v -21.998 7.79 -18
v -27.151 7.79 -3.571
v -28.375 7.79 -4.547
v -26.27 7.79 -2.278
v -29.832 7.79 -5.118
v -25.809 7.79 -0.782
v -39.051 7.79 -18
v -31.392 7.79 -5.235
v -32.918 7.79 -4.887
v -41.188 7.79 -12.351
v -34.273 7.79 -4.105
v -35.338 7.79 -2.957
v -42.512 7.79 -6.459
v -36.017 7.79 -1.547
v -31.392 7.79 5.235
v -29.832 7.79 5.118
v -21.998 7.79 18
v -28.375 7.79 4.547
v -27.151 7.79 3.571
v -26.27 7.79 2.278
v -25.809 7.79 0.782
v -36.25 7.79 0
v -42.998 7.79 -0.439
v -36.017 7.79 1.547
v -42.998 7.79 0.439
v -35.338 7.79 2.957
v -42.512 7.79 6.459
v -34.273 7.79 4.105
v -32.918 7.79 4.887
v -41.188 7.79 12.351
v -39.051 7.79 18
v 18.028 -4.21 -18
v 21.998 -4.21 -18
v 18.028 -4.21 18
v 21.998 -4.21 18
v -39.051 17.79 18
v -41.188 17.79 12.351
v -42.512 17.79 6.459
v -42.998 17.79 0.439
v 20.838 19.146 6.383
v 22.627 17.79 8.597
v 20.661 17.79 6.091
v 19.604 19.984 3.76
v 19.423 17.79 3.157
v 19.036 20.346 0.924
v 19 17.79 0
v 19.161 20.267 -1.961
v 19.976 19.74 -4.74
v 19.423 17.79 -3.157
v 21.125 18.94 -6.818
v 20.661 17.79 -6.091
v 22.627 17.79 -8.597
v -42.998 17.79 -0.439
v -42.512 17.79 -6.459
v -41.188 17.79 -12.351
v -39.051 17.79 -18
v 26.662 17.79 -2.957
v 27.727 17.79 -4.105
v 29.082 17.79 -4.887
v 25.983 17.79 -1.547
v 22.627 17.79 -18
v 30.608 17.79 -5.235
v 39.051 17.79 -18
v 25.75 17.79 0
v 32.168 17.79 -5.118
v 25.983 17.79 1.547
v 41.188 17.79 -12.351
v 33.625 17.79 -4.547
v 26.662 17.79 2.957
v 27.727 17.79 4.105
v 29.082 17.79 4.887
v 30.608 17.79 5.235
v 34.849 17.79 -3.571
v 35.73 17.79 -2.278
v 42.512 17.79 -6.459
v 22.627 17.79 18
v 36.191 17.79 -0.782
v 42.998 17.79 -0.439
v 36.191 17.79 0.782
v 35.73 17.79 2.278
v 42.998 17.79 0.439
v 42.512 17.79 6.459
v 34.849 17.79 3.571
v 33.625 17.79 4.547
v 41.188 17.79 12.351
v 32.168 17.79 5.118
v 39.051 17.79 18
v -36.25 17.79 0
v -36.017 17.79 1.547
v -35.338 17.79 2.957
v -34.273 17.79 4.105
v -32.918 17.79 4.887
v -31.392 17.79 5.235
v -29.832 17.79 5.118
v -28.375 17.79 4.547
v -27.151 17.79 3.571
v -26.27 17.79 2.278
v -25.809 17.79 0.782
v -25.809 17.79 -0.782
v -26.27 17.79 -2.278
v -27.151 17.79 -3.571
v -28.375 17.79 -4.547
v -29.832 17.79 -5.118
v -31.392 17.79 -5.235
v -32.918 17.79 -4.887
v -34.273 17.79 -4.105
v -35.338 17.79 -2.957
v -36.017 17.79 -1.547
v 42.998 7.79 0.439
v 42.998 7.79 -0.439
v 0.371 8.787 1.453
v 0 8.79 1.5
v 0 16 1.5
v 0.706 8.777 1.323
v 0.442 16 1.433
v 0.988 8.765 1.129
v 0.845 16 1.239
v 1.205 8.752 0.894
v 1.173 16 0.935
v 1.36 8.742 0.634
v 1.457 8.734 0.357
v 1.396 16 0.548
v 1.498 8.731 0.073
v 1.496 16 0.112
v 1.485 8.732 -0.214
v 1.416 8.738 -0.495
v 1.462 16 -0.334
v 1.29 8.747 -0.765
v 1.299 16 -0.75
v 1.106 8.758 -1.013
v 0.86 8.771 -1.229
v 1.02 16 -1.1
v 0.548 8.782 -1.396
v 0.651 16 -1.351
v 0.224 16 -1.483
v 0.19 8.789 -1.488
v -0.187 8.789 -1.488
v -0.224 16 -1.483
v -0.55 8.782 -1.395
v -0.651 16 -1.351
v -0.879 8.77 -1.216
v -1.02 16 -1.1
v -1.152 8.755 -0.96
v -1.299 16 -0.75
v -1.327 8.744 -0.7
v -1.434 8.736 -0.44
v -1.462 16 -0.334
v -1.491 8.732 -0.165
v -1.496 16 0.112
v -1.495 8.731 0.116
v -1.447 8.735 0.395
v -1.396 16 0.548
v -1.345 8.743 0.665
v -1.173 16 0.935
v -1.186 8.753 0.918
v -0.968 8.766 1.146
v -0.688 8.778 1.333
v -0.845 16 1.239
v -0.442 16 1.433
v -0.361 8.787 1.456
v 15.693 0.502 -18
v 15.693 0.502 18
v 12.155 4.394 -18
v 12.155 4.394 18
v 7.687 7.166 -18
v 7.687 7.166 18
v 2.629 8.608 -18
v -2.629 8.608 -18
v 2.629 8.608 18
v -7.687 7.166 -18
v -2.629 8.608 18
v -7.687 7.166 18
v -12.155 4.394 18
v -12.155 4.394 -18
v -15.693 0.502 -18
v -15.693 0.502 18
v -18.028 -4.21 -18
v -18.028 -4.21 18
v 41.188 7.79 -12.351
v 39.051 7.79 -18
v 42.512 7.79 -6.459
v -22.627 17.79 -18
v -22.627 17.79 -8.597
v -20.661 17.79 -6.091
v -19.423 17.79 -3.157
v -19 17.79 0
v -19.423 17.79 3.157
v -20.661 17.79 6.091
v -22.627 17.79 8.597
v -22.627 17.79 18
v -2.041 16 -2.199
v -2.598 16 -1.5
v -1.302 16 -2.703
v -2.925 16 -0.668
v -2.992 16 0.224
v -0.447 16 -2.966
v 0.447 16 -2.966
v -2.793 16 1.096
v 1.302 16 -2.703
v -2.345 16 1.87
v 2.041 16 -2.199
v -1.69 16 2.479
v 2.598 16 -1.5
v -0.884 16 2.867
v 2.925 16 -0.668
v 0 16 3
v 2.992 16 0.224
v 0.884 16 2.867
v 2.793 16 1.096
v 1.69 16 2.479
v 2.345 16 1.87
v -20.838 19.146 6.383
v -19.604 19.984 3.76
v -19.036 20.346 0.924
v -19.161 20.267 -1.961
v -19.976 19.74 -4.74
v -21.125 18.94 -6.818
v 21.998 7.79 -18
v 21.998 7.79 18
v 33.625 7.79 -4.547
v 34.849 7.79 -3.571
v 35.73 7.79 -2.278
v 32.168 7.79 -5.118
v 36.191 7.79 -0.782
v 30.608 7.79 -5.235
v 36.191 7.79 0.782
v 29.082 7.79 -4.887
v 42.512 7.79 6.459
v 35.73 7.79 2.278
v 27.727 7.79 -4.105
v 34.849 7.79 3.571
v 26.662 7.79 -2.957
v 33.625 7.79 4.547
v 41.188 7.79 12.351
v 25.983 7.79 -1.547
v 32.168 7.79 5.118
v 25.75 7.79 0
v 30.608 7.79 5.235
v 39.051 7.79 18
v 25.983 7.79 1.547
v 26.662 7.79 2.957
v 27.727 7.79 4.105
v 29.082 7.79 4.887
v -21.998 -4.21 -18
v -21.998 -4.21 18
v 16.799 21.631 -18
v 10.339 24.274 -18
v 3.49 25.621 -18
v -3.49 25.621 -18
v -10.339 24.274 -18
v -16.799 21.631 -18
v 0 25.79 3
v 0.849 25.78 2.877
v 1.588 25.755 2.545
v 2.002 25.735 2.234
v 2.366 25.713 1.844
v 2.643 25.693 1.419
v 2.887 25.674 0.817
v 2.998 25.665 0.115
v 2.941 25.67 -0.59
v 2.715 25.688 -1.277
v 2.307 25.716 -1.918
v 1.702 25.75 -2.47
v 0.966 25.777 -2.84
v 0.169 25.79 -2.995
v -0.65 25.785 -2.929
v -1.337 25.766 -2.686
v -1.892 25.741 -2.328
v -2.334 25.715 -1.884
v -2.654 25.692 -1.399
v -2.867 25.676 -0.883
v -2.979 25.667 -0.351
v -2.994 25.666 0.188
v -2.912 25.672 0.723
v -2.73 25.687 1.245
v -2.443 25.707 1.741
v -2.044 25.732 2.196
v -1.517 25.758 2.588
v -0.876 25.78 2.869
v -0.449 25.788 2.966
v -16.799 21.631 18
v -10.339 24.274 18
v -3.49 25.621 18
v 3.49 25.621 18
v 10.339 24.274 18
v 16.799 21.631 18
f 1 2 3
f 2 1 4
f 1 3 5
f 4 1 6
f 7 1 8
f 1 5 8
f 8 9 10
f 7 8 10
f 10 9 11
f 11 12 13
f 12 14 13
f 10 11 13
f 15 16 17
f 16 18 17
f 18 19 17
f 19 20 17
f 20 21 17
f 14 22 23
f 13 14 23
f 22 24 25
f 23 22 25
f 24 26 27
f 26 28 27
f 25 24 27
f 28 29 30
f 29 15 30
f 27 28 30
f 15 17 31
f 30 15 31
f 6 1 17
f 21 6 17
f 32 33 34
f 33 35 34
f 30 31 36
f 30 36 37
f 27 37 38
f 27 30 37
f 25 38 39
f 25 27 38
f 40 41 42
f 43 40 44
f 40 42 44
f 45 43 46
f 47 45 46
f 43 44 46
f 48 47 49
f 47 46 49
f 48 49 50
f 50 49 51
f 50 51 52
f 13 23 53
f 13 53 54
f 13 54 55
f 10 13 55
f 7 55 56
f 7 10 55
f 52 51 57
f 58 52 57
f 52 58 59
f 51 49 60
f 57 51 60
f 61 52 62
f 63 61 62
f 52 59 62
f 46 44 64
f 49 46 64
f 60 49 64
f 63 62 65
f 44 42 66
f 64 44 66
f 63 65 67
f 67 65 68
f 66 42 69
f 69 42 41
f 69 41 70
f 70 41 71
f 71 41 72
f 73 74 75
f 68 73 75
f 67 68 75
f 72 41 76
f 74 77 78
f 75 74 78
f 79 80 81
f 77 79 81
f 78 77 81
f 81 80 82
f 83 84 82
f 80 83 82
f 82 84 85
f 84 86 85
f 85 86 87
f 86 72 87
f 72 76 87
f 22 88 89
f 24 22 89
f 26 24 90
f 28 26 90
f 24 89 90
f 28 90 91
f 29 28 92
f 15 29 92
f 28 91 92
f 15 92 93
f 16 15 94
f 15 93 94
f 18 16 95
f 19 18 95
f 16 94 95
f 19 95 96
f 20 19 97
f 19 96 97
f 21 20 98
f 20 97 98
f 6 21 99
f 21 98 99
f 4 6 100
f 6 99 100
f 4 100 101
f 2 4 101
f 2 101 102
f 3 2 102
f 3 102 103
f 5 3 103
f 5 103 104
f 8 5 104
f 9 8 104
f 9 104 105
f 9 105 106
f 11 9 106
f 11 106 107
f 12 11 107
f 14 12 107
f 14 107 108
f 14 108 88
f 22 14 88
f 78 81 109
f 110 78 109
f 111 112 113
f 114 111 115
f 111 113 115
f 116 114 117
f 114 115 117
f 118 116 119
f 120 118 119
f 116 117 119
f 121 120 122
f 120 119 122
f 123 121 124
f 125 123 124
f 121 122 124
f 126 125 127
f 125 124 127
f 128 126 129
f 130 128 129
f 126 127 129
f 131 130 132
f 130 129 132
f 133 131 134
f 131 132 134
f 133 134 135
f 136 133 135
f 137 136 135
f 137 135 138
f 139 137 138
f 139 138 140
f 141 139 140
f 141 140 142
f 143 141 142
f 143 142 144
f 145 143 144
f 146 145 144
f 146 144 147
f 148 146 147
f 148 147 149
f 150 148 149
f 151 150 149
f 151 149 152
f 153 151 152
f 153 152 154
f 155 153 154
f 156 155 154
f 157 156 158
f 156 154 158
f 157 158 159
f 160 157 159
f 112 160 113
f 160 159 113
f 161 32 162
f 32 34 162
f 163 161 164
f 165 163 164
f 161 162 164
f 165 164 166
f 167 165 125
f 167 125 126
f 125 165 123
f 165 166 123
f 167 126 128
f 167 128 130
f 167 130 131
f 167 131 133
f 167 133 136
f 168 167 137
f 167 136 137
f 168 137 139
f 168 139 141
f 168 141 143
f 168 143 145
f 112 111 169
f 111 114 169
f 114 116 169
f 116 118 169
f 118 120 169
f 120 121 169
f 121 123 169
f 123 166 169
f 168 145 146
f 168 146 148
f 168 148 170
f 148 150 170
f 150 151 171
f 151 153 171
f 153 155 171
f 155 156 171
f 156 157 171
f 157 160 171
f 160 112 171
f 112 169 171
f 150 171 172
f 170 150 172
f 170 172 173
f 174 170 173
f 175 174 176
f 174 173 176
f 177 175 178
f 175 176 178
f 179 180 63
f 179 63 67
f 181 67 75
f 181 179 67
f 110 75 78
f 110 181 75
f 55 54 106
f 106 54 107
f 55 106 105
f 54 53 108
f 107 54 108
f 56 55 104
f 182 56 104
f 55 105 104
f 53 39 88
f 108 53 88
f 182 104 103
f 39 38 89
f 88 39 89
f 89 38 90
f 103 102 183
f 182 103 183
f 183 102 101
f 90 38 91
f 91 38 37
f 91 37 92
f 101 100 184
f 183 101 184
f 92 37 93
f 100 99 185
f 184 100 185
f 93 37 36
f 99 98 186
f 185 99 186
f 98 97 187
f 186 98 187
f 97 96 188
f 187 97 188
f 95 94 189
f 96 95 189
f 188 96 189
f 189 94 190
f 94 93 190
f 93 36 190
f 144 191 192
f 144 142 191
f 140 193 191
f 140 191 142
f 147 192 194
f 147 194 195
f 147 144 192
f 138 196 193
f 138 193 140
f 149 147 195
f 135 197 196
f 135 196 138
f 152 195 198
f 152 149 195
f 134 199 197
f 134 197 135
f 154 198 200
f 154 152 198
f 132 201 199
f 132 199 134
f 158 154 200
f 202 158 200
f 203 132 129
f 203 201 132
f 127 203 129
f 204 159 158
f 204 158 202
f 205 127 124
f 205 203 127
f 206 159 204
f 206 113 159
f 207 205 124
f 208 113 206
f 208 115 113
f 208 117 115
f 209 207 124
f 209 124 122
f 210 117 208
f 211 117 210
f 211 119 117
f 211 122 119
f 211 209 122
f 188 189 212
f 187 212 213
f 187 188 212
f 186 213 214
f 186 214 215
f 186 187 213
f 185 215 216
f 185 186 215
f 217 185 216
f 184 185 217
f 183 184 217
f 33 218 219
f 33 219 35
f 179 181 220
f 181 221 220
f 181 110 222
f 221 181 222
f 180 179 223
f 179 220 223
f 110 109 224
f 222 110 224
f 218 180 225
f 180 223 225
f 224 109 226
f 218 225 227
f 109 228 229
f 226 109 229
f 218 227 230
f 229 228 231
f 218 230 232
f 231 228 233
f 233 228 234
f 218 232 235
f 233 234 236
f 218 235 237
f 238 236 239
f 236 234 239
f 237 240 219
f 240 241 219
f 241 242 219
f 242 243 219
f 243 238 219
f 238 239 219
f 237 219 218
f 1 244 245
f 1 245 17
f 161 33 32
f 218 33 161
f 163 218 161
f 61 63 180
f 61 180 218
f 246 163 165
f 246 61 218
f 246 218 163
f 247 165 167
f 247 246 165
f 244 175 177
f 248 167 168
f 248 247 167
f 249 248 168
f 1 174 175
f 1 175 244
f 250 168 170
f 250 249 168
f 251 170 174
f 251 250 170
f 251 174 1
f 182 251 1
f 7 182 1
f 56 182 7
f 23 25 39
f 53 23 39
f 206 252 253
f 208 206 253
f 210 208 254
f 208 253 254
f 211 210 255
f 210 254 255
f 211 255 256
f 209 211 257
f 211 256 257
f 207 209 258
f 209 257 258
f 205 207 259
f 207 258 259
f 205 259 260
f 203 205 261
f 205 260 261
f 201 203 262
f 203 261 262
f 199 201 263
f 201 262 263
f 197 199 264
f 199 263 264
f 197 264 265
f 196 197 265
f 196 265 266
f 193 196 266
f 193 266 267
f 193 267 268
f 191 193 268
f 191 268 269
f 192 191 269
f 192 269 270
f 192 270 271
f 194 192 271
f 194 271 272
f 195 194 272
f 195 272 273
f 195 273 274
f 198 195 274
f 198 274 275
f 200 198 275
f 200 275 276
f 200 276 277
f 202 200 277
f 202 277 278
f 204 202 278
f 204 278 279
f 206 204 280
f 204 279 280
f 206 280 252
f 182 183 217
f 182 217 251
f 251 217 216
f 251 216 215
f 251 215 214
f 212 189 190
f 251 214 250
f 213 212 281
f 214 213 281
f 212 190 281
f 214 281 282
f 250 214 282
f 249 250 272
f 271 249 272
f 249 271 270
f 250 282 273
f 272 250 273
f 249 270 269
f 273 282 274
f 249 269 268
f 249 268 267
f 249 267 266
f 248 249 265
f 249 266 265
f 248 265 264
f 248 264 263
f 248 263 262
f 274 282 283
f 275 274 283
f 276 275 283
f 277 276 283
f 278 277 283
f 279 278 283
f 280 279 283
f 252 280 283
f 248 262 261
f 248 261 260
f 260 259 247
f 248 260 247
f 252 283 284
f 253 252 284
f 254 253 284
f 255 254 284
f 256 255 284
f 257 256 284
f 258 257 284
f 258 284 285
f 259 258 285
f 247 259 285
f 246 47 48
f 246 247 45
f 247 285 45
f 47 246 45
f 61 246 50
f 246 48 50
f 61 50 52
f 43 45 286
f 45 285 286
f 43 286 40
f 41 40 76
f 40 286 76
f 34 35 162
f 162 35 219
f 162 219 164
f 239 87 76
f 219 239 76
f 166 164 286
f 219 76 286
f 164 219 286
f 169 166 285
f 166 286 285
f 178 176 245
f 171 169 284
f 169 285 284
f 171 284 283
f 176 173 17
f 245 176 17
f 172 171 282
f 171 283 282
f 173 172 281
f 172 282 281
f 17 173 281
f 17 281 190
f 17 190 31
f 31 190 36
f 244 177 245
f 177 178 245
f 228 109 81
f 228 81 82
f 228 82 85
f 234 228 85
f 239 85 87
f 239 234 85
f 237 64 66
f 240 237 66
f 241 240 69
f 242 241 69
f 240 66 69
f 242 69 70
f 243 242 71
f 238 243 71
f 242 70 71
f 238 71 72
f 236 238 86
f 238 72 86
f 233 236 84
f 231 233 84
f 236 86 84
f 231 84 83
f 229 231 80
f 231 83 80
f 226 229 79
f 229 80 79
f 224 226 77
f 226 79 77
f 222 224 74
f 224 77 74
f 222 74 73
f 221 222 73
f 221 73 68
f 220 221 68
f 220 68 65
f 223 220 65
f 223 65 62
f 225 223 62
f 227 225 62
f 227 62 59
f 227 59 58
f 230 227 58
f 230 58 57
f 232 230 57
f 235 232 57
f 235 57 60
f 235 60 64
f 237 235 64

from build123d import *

# Parameters (mm, degrees)
BOSS_EXTRUDE1_DEPTH     = 18
SKETCH2_R               = 5.25
CUT_EXTRUDE1_DEPTH      = 52.54422425
CUT_EXTRUDE2_START      = -10
CUT_EXTRUDE2_DEPTH      = 10
CUT_EXTRUDE3_DEPTH      = 52.54422425
CUT_EXTRUDE4_DEPTH      = 52.544224284
SKETCH6_R               = 3
CUT_EXTRUDE5_DEPTH      = 10
CUT_EXTRUDE6_REACH      = 52.806
CUT_EXTRUDE6_END_RADIUS = 19
SKETCH7_R               = 1.5


# Read off the part's stored shape, not the designer's step: Cut-Extrude2
with BuildPart() as part:
    # Sketch1 → Boss-Extrude1 (new, symmetric)
    with BuildSketch(Plane.XY):
        with BuildLine():
            Line((22.627416998, 17.790398646), (42.997756377, 17.790398646))
            Line((42.997756377, 17.790398646), (42.997756377, 7.790398646))
            Line((42.997756377, 7.790398646), (21.997756377, 7.790398646))
            Line((21.997756377, 7.790398646), (21.997756377, -4.209601354))
            Line((21.997756377, -4.209601354), (18.027756377, -4.209601354))
            ThreePointArc((18.027756377, -4.209601354), (0, 8.790398646), (-18.027756377, -4.209601354))
            Line((-18.027756377, -4.209601354), (-21.997756377, -4.209601354))
            Line((-21.997756377, -4.209601354), (-21.997756377, 7.790398646))
            Line((-21.997756377, 7.790398646), (-42.997756377, 7.790398646))
            Line((-42.997756377, 7.790398646), (-42.997756377, 17.790398646))
            Line((-42.997756377, 17.790398646), (-22.627416998, 17.790398646))
            ThreePointArc((-22.627416998, 17.790398646), (0, 25.790398646), (22.627416998, 17.790398646))
        make_face()
    extrude(amount=BOSS_EXTRUDE1_DEPTH, both=True)

    # Sketch2 → Cut-Extrude1 (cut, through all)
    with BuildSketch(Plane(origin=(0, 17.790398646, 0), x_dir=(1, 0, 0), z_dir=(0, 1, 0))):
        with Locations(Location((-31, 0, 0), (0, 0, 180))):
            Circle(SKETCH2_R)
        with Locations(Location((31, 0, 0), (0, 0, 180))):
            Circle(SKETCH2_R)
    extrude(amount=-CUT_EXTRUDE1_DEPTH, mode=Mode.SUBTRACT)

    # Cut-Extrude2 outline → Cut-Extrude2 (cut)
    with BuildSketch(Plane(origin=(0, 17.790398646, 0), x_dir=(1, 0, 0), z_dir=(0, 1, 0)).offset(CUT_EXTRUDE2_START)):
        with BuildLine():
            ThreePointArc((39.05124838, 18), (41.953602003, 9.428429295), (42.997756377, 0.439256778))
            Line((42.997756377, 0.439256778), (42.997756377, 18))
            Line((42.997756377, 18), (39.05124838, 18))
        make_face()
        with BuildLine():
            Line((42.997756377, -18), (42.997756377, -0.439256778))
            ThreePointArc((42.997756377, -0.439256778), (41.953602003, -9.428429295), (39.05124838, -18))
            Line((39.05124838, -18), (42.997756377, -18))
        make_face()
        with BuildLine():
            ThreePointArc((-42.997756377, 0.439256778), (-41.953602003, 9.428429295), (-39.05124838, 18))
            Line((-39.05124838, 18), (-42.997756377, 18))
            Line((-42.997756377, 18), (-42.997756377, 0.439256778))
        make_face()
        with BuildLine():
            Line((-42.997756377, -18), (-39.05124838, -18))
            ThreePointArc((-39.05124838, -18), (-41.953602003, -9.428429295), (-42.997756377, -0.439256778))
            Line((-42.997756377, -0.439256778), (-42.997756377, -18))
        make_face()
    extrude(amount=CUT_EXTRUDE2_DEPTH, mode=Mode.SUBTRACT)

    # Sketch4 → Cut-Extrude3 (cut, through all)
    with BuildSketch(Plane(origin=(0, 17.790398646, 0), x_dir=(1, 0, 0), z_dir=(0, 1, 0))):
        with BuildLine():
            Line((-22.627416998, 8.596502421), (-22.627416998, -8.596502421))
            ThreePointArc((-22.627416998, -8.596502421), (-19, 0), (-22.627416998, 8.596502421))
        make_face()
    extrude(amount=CUT_EXTRUDE3_DEPTH, mode=Mode.SUBTRACT)

    # Sketch5 → Cut-Extrude4 (cut, through all)
    with BuildSketch(Plane(origin=(0, 17.790398646, 0), x_dir=(1, 0, 0), z_dir=(0, 1, 0))):
        with BuildLine():
            Line((22.627416998, 8.596502421), (22.627416998, -8.596502421))
            ThreePointArc((22.627416998, -8.596502421), (19, 0), (22.627416998, 8.596502421))
        make_face()
    extrude(amount=CUT_EXTRUDE4_DEPTH, mode=Mode.SUBTRACT)

    # Sketch6 → Cut-Extrude5 (cut)
    with BuildSketch(Plane(origin=(0, 26, 0), x_dir=(1, 0, 0), z_dir=(0, 1, 0))):
        with Locations(Location((0, 0, 0), (0, 0, 270))):
            Circle(SKETCH6_R)
    extrude(amount=-CUT_EXTRUDE5_DEPTH, mode=Mode.SUBTRACT)

    # Cut-Extrude6: up to this cylinder (the profile starts outside it)
    cut_extrude6_end = Plane(origin=(0, -10.209601354, 0), z_dir=(0, 0, -1)) * Cylinder(CUT_EXTRUDE6_END_RADIUS, 144.612, mode=Mode.PRIVATE)
    # Sketch7 → Cut-Extrude6 (cut, up to the surface)
    with BuildSketch(Plane(origin=(0, 16, 0), x_dir=(1, 0, 0), z_dir=(0, 1, 0)), mode=Mode.PRIVATE) as cut_extrude6_sk1:
        with Locations(Location((0, 0, 0), (0, 0, 270))):
            Circle(SKETCH7_R)
    cut_extrude6_tool1 = extrude(cut_extrude6_sk1.sketch, amount=-CUT_EXTRUDE6_REACH, mode=Mode.PRIVATE) - cut_extrude6_end
    add(cut_extrude6_tool1.solids().sort_by_distance((0, 16, 0))[0], mode=Mode.SUBTRACT)


solid = part.part
